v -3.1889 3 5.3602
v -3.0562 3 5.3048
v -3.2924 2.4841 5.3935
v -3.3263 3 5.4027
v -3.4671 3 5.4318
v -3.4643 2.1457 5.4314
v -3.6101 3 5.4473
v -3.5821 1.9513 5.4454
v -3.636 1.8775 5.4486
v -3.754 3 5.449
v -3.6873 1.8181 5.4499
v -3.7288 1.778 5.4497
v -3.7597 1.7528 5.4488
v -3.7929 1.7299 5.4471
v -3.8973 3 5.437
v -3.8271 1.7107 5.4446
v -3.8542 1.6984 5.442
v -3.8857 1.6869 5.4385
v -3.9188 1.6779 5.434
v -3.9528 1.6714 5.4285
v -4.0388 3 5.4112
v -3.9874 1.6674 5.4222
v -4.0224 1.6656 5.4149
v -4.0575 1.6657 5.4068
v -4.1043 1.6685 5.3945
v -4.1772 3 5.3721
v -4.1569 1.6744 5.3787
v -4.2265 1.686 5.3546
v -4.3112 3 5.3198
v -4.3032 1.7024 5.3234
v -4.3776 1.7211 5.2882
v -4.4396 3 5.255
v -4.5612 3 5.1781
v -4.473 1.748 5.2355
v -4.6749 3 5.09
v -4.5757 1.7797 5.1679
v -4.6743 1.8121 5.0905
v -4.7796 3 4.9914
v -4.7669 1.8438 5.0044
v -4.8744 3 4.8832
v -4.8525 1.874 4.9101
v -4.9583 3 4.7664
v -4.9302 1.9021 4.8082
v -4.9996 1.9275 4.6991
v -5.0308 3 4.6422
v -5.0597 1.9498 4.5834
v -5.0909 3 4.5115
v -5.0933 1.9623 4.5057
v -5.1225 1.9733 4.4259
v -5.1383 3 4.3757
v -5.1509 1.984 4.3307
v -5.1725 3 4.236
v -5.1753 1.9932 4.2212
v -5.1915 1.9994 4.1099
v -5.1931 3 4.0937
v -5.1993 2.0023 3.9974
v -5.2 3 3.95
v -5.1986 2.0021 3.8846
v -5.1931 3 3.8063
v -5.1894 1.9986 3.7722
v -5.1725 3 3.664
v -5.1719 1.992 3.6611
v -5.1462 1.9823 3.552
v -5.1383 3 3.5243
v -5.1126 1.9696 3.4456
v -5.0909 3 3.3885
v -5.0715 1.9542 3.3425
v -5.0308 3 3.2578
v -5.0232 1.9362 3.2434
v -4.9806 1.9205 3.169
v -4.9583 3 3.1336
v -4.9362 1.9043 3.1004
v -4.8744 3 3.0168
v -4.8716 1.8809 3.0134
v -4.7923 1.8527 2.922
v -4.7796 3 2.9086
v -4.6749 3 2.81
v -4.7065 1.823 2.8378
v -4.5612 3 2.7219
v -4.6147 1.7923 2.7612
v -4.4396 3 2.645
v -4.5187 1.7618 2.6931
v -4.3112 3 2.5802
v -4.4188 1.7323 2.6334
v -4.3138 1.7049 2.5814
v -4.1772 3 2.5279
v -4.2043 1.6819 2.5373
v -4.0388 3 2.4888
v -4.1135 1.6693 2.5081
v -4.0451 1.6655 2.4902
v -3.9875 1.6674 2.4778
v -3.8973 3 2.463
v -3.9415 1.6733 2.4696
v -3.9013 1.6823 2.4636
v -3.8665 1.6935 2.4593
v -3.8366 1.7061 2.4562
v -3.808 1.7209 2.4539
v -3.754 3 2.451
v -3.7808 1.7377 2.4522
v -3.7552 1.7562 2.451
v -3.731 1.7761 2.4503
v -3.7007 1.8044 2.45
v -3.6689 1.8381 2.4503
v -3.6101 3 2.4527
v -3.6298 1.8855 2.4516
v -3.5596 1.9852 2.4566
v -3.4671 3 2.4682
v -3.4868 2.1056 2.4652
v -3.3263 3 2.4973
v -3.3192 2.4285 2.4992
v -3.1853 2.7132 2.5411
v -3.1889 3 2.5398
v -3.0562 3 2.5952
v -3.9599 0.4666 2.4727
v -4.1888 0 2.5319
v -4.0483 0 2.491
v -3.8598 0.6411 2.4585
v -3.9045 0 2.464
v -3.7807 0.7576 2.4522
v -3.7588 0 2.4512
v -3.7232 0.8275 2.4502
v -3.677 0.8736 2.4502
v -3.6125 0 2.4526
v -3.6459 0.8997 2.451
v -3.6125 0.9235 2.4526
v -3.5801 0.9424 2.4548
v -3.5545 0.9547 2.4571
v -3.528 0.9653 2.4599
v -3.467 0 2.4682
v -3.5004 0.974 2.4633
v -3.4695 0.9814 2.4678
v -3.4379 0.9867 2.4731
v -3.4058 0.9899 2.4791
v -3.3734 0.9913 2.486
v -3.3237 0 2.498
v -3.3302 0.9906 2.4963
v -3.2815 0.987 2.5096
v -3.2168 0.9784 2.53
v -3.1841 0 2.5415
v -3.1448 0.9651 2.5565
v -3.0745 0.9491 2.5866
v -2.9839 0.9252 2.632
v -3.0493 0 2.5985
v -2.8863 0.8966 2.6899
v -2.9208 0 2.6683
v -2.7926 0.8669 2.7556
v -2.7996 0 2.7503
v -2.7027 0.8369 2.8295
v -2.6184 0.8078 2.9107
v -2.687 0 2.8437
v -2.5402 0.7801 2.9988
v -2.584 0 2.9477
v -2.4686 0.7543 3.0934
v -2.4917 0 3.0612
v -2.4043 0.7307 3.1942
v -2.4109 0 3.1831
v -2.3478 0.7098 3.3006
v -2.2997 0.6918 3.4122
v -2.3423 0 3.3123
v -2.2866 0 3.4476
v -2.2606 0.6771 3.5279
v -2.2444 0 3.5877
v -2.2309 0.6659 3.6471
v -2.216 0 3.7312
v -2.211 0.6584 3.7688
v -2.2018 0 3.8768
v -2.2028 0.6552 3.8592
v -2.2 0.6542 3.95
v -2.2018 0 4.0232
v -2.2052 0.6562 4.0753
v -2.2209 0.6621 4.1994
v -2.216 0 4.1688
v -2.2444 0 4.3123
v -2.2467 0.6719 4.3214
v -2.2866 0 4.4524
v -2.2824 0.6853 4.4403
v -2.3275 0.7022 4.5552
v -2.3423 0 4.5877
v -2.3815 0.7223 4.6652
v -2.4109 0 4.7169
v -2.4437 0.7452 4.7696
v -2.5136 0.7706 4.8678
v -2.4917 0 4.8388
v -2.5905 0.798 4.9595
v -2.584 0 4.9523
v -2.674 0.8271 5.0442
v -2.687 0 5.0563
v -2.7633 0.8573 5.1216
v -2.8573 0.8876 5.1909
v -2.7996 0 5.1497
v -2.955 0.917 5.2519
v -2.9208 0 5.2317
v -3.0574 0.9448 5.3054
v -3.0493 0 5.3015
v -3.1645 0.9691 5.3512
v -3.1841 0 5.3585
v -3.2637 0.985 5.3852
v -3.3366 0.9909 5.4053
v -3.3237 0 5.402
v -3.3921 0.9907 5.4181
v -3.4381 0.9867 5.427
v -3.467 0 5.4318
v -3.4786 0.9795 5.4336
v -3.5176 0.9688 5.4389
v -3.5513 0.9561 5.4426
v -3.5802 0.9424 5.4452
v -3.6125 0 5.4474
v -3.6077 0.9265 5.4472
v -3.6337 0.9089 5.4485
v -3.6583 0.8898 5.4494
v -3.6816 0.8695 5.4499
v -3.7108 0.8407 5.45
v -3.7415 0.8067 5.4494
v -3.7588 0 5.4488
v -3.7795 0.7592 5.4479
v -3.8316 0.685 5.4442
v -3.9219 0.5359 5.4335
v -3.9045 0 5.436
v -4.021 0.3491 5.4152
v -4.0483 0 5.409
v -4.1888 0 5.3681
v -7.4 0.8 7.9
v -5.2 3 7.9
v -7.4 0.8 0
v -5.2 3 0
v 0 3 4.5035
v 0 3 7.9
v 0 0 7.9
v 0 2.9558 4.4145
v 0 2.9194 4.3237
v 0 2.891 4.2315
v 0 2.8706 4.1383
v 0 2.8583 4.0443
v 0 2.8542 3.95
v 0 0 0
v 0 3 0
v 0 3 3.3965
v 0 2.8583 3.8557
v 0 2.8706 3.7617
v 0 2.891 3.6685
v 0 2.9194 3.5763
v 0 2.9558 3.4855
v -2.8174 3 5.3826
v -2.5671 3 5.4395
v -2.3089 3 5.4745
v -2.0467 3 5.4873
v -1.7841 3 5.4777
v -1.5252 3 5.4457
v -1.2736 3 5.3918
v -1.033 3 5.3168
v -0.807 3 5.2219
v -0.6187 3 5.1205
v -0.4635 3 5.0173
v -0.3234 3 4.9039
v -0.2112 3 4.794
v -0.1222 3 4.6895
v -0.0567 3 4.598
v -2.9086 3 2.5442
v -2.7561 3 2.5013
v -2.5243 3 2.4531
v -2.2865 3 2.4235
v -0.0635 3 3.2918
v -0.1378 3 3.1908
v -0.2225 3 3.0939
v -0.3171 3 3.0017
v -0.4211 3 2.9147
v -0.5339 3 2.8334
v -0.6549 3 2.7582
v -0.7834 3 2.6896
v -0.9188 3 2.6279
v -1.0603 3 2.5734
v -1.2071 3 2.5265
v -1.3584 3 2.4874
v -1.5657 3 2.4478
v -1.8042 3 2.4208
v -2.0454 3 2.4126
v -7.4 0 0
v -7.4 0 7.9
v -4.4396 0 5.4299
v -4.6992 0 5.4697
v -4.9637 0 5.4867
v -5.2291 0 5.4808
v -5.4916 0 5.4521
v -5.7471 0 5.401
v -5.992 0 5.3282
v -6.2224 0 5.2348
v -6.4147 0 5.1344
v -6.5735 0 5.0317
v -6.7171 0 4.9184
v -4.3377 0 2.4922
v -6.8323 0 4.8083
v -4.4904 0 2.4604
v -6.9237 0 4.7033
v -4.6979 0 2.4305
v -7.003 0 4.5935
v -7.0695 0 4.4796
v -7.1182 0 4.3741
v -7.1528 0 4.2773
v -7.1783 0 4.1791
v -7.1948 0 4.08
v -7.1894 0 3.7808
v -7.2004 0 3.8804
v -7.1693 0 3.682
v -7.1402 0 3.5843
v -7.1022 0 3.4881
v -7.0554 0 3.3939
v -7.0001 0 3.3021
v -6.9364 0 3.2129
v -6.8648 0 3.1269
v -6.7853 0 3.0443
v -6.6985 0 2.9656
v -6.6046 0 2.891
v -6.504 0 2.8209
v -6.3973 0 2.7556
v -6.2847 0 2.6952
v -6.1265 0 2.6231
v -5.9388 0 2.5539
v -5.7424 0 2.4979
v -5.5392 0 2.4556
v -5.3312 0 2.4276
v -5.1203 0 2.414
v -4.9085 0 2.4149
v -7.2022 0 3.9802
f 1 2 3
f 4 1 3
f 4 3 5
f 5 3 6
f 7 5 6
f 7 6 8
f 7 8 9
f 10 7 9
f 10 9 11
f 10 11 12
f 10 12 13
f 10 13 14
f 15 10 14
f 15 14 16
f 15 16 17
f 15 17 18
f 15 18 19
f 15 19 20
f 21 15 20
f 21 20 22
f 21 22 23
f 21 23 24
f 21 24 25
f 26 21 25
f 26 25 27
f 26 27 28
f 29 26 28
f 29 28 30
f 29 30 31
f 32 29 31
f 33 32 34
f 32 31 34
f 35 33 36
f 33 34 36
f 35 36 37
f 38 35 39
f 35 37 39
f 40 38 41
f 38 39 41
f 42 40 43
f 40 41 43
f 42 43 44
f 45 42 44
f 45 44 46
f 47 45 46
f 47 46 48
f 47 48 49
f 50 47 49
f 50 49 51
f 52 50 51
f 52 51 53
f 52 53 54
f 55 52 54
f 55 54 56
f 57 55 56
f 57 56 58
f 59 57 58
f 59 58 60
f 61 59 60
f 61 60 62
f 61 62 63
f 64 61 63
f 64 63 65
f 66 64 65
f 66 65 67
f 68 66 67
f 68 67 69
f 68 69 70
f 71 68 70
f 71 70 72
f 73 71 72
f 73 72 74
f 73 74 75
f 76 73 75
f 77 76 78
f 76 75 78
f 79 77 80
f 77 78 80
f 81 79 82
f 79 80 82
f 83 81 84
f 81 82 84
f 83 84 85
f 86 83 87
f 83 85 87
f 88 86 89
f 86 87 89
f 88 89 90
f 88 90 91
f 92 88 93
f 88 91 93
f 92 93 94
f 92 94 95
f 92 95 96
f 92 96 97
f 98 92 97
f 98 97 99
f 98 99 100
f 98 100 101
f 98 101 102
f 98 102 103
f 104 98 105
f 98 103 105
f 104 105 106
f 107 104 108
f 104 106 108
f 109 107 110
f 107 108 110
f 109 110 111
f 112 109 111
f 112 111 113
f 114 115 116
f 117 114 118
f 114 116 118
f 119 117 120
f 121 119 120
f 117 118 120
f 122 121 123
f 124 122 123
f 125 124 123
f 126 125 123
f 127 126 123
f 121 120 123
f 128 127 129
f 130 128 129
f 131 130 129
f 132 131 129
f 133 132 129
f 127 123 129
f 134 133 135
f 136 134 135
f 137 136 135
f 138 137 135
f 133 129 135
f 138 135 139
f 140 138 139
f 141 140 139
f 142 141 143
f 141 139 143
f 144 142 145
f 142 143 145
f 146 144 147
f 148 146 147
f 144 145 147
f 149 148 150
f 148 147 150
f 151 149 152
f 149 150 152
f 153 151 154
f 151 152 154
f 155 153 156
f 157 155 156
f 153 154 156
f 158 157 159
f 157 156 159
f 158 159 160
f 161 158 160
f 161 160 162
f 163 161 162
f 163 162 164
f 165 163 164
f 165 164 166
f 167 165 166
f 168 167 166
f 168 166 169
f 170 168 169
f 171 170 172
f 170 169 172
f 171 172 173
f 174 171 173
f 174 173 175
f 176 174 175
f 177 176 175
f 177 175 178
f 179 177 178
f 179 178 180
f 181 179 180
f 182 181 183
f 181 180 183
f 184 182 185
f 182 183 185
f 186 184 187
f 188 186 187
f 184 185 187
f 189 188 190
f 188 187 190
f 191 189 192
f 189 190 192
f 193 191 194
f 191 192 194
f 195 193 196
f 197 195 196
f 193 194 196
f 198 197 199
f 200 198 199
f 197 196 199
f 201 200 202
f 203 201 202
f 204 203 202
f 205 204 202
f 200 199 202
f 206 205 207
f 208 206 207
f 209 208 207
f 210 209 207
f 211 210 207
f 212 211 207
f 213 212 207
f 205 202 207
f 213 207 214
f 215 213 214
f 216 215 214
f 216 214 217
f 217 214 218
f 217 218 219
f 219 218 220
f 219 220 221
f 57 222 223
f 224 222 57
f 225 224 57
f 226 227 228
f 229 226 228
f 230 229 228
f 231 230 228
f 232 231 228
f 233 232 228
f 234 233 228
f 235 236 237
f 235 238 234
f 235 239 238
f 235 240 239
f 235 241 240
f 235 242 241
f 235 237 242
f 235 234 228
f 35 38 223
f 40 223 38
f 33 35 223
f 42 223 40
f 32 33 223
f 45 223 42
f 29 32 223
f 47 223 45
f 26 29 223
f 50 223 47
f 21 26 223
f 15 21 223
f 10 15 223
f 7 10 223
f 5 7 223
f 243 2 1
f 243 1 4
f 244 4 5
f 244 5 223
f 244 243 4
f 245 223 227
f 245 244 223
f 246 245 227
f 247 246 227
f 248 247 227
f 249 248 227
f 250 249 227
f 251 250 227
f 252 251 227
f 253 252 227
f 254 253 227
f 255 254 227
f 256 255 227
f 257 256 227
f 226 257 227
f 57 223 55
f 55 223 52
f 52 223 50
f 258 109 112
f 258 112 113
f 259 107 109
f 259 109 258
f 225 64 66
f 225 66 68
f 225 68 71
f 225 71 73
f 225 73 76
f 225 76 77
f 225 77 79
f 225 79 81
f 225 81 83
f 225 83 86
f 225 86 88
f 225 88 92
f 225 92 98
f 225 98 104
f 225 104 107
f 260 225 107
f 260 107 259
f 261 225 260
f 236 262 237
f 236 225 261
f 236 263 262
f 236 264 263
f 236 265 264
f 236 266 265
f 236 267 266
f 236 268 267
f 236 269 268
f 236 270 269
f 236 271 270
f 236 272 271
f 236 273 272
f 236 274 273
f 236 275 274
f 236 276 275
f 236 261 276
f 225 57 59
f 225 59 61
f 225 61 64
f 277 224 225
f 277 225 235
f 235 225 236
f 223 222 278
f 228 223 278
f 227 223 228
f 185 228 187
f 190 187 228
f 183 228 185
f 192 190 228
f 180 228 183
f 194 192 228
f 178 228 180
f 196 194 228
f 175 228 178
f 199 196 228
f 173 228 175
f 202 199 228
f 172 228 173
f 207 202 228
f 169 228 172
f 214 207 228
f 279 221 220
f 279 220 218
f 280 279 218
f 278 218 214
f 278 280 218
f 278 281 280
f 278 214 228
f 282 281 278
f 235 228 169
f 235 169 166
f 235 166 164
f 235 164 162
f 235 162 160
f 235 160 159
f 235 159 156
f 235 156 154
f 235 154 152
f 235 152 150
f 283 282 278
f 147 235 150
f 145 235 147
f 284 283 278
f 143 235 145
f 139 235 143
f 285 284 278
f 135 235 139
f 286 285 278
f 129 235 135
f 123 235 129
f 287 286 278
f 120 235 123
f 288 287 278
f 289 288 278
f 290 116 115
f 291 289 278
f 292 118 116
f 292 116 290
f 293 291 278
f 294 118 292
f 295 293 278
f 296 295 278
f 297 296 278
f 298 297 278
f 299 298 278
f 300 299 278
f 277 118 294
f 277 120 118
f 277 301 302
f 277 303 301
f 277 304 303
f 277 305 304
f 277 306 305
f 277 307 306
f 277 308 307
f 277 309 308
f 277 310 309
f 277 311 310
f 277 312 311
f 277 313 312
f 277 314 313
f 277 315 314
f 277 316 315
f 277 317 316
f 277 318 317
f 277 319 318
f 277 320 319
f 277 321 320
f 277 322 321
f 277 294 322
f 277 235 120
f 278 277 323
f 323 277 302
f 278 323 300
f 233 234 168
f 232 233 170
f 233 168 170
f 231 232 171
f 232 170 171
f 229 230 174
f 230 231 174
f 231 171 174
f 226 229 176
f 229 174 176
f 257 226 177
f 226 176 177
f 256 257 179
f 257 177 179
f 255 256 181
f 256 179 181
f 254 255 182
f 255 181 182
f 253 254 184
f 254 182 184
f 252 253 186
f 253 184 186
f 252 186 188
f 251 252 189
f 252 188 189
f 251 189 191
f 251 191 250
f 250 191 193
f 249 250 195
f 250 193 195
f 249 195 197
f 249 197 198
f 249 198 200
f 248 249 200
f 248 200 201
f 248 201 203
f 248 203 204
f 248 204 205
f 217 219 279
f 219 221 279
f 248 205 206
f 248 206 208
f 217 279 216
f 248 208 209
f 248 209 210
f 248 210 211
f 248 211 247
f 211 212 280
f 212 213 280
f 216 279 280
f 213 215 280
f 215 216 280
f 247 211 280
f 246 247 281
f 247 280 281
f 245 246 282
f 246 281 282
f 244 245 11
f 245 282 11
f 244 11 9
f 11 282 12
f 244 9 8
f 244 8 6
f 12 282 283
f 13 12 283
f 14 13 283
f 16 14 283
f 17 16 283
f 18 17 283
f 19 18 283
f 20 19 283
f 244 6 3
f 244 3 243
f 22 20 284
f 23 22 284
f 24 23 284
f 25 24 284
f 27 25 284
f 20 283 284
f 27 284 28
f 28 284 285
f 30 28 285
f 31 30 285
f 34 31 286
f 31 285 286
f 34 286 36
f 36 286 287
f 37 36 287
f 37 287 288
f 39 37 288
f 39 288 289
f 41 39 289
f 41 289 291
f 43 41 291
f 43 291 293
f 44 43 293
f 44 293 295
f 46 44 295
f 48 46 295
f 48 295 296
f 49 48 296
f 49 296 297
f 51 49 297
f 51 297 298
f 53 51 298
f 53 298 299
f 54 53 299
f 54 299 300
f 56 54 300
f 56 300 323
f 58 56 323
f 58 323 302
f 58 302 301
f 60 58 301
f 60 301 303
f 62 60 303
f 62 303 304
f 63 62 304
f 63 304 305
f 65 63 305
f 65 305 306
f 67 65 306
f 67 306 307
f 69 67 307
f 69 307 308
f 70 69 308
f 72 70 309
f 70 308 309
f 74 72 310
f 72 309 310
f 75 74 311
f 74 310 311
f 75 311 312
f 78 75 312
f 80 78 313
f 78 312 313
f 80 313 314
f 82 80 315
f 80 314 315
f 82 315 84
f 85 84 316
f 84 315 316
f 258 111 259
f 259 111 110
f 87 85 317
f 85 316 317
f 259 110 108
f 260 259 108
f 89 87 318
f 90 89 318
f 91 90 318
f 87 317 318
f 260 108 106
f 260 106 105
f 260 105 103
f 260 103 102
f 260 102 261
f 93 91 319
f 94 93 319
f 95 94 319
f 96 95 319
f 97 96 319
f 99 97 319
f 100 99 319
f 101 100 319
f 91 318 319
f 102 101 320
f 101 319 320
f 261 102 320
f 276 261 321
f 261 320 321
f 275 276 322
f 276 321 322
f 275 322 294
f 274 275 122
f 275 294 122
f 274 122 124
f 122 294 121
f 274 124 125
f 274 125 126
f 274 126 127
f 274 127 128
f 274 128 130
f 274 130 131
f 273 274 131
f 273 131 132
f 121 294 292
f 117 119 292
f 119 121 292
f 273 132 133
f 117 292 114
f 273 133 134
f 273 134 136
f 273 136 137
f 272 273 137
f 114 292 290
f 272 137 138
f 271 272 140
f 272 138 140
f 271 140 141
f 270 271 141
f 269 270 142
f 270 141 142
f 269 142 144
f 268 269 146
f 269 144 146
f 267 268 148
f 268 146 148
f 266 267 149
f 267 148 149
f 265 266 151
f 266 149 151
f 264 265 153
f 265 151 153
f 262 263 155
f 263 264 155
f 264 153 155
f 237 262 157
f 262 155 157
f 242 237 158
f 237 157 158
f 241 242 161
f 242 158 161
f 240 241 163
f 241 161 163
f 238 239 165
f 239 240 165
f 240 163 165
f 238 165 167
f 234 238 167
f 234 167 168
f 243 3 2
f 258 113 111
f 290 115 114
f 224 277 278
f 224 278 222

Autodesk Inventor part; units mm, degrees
ref_plane "YZ Plane" through (0, 0, 0) normal (1, 0, 0) x (0, 1, 0)
ref_plane "XZ Plane" through (0, 0, 0) normal (0, 1, 0) x (-1, 0, 0)
ref_plane "XY Plane" through (0, 0, 0) normal (0, 0, 1) x (1, 0, 0)
sketch "Sketch1" plane through (0, 0, 0) normal (0, 0, 1) x (1, 0, 0)
  line L0 (0, 0) -> (-7.4, 0)
  line L1 (-7.4, 0) -> (-7.4, 3)
  line L2 (-7.4, 3) -> (0, 3)
  line L3 (0, 3) -> (0, 0)
  line L4 (-7.4, 0) -> (-7.4, 0.8)
  line L5 (-7.4, 0.8) -> (-5.2, 3)
  dimension "d0" = 7.4
  dimension "d1" = 3
  dimension "d3" = 135
  dimension "d11" = 2.2
extrude "Extrusion1" add sketch "Sketch1" along normal blind 7.9 contours L0 L1 L5 L2 L3
sketch "Sketch2" plane through (-7.4, 0, 0) normal (0, -1, 0) x (1, 0, 0)
  line L0 (0, 0) -> (7.4, 0) projected
  line L1 (7.4, 0) -> (7.4, 7.9) projected
  line L2 (0, 7.9) -> (7.4, 7.9) projected
  line L3 (0, 0) -> (0, 7.9) projected
  circle A0 centre (3.7, 3.95) radius 1.5
  dimension "d6" = 3
extrude "Extrusion2" cut sketch "Sketch2" against normal blind 7.9 contours A0
sketch "Sketch3" plane through (-7.4, 0, 0) normal (0, -1, 0) x (1, 0, 0)
  point P0 (7.4, 0)
ref_plane "Work Plane1" through (-15.6286, 1.0607, 21.7368) normal (-0.7071, -0.7071, 0) x (0.7071, -0.7071, 0)
sketch "Sketch4" plane through (-15.6286, 1.0607, 21.7368) normal (-0.7071, -0.7071, 0) x (0.7071, -0.7071, 0)
  ellipse E0 centre (9.1848, -17.7868) end of major axis (9.1848, -16.2868) minor radius 1.0607 construction
  line L0 (6.5685, -21.7368) -> (11.8011, -21.7368) projected
  line L1 (11.8011, -21.7368) -> (11.8011, -13.8368) projected
  line L2 (6.5685, -13.8368) -> (11.8011, -13.8368) projected
  line L3 (6.5685, -21.7368) -> (6.5685, -13.8368) projected
  ellipse E1 centre (9.1848, -17.7868) end of major axis (9.1848, -16.2868) minor radius 1.0607 construction
  circle A0 centre (9.1848, -17.7868) radius 1.5 construction
  circle A1 centre (8.2455, -17.7868) radius 1.5374
extrude "Extrusion3" cut sketch "Sketch4" against normal through all contours A1
properties part number "00_KES400_DichroicMirror" material "PMMA Plastic"
